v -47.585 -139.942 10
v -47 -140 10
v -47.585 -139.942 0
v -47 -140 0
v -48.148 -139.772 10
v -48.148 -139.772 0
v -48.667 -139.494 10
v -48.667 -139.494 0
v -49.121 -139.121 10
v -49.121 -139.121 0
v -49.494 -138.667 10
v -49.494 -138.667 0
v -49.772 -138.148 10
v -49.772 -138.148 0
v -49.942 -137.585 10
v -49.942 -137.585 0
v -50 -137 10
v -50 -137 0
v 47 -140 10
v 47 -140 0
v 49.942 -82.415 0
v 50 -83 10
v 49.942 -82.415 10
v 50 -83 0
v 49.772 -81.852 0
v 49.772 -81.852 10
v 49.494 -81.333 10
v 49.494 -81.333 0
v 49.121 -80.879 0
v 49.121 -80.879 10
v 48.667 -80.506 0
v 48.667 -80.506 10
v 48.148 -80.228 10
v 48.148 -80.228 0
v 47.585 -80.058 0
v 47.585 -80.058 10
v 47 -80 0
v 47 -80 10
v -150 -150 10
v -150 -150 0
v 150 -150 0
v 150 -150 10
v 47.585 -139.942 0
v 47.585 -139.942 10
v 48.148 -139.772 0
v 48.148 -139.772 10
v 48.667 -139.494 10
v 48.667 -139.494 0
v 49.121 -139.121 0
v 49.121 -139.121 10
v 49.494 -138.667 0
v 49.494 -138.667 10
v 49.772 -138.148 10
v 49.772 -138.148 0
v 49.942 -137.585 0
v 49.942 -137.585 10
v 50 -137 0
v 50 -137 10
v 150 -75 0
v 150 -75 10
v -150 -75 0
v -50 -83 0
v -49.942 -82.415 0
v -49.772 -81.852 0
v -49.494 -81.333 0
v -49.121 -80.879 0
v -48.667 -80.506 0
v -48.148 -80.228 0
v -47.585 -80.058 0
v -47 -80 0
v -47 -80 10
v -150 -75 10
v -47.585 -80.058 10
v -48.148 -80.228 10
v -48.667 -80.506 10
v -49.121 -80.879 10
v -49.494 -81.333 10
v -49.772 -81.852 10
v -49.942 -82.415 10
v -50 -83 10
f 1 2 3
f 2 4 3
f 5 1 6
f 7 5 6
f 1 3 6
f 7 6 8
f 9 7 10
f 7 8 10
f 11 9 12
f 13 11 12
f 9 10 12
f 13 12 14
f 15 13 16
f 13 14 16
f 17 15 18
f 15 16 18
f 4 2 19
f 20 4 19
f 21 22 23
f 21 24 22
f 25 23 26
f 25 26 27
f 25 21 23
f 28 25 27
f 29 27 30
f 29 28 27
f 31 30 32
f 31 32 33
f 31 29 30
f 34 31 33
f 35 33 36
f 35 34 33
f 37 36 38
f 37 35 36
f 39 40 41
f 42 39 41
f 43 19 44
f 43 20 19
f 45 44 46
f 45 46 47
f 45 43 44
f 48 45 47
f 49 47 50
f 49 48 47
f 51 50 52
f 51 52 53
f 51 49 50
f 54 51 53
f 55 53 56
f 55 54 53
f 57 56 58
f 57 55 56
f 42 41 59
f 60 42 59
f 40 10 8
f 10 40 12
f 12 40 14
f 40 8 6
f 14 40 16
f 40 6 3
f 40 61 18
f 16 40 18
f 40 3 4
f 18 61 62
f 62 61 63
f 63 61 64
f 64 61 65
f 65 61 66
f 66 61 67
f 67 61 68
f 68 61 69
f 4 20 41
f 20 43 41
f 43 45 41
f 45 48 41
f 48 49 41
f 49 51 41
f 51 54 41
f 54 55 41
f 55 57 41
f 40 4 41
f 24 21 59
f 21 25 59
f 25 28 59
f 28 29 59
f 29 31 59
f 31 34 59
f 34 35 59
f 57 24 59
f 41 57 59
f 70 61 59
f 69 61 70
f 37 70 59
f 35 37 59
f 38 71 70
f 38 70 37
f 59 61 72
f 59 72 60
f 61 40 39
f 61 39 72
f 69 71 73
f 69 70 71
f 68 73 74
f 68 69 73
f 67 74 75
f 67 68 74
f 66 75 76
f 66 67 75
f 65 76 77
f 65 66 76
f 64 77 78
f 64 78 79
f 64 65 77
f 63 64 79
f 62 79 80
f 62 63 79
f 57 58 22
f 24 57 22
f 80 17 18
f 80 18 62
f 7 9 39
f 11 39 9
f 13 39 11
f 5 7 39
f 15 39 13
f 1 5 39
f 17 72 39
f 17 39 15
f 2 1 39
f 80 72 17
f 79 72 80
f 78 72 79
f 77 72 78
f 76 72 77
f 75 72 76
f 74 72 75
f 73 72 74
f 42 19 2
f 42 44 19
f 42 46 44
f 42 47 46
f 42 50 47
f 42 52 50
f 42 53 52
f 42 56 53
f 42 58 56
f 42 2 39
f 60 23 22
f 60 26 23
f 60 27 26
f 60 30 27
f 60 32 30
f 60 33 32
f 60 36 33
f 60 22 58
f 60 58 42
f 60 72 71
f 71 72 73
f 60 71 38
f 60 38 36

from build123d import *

# Parameters (mm, degrees)
SKIZZE1_W                       = 300
SKIZZE1_H                       = 75
LINEAR_AUSTRAGEN1_DEPTH         = 10
SKIZZE2_W                       = 100
SKIZZE2_H                       = 60
SCHNITT_LINEAR_AUSTRAGEN1_DEPTH = 10
VERRUNDUNG1_R                   = 3


with BuildPart() as part:
    # Skizze1 → Linear austragen1 (new body)
    with BuildSketch(Plane.XY):
        with Locations((0, -112.5)):
            Rectangle(SKIZZE1_W, SKIZZE1_H)
    extrude(amount=LINEAR_AUSTRAGEN1_DEPTH)

    # Skizze2 → Schnitt-Linear austragen1 (cut)
    with BuildSketch(Plane.XY.offset(10)):
        with Locations((0, -110)):
            Rectangle(SKIZZE2_W, SKIZZE2_H)
    extrude(amount=-SCHNITT_LINEAR_AUSTRAGEN1_DEPTH, mode=Mode.SUBTRACT)

    # Verrundung1
    verrundung1_edges = [part.edges().sort_by_distance(p)[0] for p in [
        (50, -80, 5),
        (50, -140, 5),
        (-50, -140, 5),
        (-50, -80, 5),
    ]]
    fillet(verrundung1_edges, radius=VERRUNDUNG1_R)


solid = part.part
